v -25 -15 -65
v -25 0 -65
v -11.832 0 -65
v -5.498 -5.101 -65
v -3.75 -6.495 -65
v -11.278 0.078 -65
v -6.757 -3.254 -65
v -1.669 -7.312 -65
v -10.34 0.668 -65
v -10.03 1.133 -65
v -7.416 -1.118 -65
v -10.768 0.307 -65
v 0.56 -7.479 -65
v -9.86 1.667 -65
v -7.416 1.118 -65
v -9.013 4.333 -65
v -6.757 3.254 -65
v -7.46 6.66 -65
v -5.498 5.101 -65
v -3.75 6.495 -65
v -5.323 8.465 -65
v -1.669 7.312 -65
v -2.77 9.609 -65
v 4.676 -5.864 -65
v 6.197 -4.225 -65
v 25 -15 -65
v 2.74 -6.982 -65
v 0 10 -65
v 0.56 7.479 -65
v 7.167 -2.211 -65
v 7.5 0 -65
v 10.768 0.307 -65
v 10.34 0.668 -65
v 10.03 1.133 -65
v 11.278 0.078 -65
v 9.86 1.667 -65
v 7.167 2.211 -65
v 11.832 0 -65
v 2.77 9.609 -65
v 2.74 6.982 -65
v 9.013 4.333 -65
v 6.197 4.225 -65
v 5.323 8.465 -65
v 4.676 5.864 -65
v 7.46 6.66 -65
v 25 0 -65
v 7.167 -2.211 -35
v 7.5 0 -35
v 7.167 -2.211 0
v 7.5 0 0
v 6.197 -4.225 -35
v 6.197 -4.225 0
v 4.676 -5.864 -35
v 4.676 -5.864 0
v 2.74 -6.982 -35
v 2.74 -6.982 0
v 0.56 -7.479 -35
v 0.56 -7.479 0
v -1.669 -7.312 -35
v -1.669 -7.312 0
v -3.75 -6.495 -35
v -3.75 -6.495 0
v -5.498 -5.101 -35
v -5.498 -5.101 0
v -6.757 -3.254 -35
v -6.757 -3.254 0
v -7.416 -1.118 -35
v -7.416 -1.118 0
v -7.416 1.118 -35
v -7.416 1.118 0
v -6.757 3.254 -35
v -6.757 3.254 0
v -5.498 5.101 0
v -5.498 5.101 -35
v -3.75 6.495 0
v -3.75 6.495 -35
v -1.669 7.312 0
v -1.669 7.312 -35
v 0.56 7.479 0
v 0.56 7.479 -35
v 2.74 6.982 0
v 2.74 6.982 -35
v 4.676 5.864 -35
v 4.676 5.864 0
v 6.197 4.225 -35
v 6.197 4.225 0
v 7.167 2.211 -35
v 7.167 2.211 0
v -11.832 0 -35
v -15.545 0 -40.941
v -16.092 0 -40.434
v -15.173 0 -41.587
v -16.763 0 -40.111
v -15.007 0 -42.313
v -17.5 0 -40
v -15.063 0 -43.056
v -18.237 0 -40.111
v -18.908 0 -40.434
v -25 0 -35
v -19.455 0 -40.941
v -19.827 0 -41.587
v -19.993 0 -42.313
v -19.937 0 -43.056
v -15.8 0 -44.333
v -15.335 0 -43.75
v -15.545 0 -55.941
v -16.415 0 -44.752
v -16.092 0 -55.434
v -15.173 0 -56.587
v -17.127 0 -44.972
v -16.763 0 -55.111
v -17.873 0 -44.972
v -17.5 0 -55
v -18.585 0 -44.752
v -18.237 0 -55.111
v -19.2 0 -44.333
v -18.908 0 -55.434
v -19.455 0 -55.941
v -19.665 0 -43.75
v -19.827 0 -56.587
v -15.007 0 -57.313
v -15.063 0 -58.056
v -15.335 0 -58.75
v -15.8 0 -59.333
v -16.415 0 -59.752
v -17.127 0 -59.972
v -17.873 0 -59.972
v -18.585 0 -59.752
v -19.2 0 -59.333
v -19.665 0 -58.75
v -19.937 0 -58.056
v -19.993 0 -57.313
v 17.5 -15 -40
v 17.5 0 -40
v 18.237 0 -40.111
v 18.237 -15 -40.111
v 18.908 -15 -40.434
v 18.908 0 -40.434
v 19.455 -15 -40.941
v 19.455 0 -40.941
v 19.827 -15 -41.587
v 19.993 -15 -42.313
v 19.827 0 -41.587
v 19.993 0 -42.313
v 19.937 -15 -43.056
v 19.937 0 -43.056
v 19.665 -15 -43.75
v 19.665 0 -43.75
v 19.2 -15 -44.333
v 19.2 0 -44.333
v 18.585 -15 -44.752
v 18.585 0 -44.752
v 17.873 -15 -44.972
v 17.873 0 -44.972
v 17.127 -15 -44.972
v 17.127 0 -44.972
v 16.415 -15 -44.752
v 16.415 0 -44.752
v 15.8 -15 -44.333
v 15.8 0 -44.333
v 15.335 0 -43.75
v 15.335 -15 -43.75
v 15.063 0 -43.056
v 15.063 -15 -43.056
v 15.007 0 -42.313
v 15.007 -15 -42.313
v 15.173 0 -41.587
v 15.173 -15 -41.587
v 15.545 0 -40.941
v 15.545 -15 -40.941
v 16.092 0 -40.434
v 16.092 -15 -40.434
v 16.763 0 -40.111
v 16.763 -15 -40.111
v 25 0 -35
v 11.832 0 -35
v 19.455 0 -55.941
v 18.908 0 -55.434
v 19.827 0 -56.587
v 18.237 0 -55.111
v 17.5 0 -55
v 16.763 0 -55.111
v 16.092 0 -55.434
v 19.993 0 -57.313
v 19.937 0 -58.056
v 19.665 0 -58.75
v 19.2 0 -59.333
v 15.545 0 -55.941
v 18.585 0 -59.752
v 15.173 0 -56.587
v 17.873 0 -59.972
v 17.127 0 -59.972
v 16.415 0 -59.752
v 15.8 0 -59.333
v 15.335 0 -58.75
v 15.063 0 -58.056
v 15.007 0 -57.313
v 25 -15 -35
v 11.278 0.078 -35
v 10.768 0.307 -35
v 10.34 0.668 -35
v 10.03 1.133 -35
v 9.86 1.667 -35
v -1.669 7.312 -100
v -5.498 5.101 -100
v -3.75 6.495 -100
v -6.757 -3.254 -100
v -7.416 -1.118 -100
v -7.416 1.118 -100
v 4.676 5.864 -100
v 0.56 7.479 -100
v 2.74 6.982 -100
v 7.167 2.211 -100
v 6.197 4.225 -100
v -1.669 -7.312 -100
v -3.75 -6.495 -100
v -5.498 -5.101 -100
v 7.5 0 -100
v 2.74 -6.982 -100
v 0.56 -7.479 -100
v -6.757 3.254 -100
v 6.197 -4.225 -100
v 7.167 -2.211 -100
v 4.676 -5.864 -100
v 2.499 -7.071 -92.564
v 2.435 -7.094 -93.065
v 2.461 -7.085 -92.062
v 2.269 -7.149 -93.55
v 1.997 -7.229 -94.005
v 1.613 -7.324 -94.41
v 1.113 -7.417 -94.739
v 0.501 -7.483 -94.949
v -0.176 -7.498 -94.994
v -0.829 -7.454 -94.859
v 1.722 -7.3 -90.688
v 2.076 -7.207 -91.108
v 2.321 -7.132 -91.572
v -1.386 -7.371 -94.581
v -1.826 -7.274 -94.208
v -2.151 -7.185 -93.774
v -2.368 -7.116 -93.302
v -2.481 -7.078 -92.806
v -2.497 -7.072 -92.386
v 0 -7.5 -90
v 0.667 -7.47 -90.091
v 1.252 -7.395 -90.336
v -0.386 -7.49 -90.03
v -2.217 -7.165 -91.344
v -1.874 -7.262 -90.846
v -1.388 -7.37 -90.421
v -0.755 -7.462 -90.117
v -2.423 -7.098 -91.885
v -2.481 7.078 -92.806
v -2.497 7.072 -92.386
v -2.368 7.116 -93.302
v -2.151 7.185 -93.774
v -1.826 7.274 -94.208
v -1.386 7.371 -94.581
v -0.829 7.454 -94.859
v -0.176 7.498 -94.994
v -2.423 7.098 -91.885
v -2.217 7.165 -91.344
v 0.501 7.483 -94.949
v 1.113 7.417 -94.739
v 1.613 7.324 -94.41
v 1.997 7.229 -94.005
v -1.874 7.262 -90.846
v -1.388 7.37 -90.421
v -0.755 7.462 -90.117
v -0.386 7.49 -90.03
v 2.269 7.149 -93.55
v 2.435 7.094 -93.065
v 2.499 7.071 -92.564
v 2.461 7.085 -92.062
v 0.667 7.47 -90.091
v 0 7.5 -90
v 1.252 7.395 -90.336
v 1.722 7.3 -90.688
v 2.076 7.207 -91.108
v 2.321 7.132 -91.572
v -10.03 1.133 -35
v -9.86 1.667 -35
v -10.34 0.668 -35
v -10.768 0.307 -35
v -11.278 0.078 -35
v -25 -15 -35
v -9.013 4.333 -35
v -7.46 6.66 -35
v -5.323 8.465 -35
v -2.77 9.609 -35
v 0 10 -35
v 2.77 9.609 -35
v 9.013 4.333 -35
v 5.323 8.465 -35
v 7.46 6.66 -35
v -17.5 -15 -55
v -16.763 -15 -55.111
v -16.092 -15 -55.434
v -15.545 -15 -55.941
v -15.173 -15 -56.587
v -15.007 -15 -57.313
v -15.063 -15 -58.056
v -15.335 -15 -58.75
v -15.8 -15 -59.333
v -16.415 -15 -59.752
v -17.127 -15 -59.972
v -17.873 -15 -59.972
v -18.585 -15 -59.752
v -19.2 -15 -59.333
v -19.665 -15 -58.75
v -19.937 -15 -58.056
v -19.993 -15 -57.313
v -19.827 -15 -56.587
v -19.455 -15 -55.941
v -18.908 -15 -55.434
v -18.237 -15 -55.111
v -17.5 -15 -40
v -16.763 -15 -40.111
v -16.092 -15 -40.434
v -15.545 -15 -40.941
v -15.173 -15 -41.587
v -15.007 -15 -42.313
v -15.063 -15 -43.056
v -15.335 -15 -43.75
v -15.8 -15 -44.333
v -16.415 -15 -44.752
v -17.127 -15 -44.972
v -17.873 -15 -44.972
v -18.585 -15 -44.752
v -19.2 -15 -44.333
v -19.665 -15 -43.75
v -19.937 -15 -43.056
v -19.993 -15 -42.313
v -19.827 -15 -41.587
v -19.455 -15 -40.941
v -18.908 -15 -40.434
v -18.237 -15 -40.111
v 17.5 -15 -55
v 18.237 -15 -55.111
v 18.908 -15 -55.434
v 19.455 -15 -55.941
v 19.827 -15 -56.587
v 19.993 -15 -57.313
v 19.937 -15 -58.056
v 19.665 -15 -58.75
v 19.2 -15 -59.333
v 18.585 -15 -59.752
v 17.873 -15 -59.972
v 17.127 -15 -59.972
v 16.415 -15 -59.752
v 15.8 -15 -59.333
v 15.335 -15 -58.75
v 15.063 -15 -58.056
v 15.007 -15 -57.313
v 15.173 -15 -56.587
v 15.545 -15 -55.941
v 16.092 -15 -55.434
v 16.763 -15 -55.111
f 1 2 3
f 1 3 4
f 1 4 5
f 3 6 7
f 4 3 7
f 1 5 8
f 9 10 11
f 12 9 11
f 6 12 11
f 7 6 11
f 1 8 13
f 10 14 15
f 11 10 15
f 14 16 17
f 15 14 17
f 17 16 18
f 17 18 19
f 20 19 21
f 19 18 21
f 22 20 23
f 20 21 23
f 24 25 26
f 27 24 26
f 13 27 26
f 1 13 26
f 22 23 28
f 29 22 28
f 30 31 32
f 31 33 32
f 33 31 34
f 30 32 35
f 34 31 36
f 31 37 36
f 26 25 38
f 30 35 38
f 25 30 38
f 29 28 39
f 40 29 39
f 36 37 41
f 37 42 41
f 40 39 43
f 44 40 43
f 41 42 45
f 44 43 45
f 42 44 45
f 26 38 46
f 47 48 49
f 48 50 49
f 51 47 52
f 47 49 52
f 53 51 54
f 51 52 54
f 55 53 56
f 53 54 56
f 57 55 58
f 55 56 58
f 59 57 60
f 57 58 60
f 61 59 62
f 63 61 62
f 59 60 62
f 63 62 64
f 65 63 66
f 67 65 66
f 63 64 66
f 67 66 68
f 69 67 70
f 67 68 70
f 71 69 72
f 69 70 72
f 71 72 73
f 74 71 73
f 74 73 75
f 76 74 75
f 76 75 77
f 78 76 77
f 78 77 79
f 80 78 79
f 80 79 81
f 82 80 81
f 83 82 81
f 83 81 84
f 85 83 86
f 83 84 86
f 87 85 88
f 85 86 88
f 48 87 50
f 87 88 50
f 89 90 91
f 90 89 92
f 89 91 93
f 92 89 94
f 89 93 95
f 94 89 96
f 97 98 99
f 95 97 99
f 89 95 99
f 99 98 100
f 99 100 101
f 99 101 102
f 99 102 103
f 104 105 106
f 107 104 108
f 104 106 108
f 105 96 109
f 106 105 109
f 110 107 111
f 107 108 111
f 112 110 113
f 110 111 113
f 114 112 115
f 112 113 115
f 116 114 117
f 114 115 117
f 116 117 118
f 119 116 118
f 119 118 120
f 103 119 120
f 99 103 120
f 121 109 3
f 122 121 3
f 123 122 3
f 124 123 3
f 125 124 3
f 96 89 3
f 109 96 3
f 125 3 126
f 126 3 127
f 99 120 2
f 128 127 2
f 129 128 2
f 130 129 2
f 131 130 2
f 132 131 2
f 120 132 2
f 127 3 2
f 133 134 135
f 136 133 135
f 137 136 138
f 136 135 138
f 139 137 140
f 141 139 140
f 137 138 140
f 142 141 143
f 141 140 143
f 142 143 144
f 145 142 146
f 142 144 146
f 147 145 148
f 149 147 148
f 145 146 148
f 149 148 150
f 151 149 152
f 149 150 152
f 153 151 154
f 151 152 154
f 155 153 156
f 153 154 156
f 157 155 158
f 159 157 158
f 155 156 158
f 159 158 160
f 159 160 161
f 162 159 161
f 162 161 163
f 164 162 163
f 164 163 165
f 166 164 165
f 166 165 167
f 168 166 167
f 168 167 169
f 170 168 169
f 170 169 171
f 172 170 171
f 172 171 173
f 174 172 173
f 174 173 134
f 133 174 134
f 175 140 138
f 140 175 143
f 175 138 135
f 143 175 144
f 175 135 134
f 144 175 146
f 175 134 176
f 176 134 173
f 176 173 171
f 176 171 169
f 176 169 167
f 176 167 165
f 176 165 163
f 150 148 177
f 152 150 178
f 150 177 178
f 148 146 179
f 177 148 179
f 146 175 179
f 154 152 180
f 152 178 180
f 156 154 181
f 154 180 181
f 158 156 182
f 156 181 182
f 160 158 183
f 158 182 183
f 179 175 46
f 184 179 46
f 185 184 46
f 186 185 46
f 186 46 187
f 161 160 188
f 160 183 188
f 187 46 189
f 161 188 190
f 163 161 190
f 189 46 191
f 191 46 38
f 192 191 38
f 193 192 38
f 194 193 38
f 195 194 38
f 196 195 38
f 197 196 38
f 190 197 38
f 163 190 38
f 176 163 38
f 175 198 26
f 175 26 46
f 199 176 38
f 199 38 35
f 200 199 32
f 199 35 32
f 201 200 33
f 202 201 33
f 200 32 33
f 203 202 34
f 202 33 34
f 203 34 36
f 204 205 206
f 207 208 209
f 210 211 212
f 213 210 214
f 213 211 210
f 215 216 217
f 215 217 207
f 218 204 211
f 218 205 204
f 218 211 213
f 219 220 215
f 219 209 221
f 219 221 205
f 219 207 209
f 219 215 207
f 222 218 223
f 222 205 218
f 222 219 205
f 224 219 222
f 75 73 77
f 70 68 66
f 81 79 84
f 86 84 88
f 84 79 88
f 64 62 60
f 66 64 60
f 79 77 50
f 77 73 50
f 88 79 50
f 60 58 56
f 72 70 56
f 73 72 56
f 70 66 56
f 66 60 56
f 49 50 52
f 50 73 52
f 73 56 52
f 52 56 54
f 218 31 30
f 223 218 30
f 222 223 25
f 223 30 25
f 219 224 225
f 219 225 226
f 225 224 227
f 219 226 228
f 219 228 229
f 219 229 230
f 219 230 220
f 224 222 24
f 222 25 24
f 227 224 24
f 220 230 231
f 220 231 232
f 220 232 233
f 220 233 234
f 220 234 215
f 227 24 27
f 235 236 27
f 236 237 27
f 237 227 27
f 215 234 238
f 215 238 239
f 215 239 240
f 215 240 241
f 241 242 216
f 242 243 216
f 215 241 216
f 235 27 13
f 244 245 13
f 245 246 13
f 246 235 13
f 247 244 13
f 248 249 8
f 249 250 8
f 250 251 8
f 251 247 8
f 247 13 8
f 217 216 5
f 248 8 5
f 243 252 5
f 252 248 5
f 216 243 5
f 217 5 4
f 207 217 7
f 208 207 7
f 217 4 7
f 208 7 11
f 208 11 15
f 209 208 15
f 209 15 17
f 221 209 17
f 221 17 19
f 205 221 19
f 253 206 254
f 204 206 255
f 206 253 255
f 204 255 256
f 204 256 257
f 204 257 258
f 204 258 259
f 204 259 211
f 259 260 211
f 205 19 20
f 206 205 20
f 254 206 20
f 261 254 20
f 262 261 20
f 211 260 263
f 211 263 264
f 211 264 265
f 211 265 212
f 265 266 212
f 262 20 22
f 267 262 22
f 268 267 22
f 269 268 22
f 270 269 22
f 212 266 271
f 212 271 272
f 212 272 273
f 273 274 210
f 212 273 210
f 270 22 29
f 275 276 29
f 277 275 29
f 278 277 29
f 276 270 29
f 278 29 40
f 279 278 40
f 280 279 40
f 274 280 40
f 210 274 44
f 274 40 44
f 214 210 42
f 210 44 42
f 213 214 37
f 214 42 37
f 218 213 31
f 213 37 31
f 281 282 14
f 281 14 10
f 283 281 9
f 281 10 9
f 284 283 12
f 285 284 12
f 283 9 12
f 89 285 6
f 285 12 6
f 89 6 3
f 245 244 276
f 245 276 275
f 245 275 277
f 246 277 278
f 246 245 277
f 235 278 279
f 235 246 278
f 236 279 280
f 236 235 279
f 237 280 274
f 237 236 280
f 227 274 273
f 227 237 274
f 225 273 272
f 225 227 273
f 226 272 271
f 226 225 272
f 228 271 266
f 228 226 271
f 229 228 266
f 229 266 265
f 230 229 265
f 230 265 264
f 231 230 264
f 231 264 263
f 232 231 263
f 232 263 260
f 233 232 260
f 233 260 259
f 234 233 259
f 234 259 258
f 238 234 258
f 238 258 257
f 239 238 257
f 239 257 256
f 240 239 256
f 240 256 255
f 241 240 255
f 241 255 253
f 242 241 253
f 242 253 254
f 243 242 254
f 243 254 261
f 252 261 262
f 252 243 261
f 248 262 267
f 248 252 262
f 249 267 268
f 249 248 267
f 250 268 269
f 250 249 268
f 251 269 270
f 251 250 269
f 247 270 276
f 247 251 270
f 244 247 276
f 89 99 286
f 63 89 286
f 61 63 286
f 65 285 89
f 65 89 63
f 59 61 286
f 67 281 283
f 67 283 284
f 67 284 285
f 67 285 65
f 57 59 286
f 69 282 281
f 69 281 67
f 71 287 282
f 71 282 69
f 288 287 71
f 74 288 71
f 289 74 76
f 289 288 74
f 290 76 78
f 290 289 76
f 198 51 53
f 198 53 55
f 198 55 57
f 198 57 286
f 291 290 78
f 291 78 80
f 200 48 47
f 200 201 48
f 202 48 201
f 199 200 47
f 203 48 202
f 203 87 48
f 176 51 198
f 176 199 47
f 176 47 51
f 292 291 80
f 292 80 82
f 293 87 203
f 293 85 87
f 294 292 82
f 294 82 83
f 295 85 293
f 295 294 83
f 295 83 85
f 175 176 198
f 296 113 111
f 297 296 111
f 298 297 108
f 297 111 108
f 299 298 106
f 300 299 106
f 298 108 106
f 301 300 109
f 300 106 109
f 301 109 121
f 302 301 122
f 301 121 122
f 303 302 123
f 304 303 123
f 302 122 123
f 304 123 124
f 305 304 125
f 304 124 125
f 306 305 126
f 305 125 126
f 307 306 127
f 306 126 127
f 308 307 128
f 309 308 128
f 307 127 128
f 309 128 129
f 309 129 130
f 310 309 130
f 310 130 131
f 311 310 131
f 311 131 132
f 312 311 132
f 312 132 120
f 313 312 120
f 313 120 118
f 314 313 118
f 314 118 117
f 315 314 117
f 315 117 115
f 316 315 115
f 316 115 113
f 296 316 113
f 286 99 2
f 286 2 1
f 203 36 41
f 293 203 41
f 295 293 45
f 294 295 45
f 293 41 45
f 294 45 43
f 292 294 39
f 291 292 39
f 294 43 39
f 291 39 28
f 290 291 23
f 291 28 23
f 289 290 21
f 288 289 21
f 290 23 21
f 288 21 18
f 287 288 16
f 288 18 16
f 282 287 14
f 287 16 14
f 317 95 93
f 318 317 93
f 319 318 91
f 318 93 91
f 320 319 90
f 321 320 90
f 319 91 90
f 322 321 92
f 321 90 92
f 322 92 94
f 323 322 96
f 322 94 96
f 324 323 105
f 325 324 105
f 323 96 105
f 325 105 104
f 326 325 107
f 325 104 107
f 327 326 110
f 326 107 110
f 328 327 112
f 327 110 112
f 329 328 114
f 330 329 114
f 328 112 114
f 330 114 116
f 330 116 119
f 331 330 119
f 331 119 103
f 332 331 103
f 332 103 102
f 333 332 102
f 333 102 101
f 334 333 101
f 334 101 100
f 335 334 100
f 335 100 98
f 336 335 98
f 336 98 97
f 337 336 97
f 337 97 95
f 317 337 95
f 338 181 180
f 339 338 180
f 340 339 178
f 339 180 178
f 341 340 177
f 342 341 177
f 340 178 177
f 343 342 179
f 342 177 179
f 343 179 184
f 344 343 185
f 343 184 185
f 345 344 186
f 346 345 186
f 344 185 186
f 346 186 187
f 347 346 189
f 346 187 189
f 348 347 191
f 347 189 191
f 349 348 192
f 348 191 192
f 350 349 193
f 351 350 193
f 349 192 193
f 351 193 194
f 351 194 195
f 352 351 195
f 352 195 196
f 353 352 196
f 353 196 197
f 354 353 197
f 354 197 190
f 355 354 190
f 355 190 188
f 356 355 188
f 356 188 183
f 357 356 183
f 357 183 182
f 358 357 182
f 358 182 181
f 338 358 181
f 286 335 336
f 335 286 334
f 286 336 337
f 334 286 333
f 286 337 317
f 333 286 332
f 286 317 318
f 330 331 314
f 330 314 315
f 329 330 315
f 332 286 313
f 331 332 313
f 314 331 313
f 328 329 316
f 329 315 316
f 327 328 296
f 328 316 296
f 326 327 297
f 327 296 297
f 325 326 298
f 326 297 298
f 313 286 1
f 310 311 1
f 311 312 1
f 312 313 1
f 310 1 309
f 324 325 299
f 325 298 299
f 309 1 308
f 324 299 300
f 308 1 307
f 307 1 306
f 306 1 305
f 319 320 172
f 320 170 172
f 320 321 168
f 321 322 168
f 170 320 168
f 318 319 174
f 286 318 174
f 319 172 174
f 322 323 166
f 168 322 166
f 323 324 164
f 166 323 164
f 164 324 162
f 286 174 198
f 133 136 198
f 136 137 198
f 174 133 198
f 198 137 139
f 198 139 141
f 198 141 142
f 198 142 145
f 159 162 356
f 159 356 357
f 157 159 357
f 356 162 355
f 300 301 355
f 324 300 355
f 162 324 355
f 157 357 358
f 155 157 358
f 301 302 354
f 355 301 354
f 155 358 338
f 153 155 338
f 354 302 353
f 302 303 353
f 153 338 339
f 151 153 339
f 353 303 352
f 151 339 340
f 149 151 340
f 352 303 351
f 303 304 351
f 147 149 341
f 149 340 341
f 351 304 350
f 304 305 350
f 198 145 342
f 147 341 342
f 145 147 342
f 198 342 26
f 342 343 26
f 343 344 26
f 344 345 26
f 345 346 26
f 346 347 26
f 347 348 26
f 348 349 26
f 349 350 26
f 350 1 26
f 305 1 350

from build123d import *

# Parameters (mm, degrees)
BOSS_EXTRUDE1_DEPTH      = 15
BOSS_EXTRUDE1_DEPTH_BACK = 15
SKETCH6_R                = 2.5
CUT_EXTRUDE2_DEPTH       = 25
CUT_EXTRUDE3_DEPTH       = 35
CUT_EXTRUDE3_DEPTH_BACK  = 30
SKETCH8_R                = 2.5


with BuildPart() as part:
    # Sketch1 → Revolve1 (revolve)
    with BuildSketch(Plane(origin=(0, 0, 0), x_dir=(1, 0, 0), z_dir=(0, 1, 0))):
        Polygon((0, 90), (0, 100), (2, 100), (7.5, 100), (7.5, 65), (9, 65), (9, 35), (7.5, 35), (7.5, 0), (0, 0), align=None)
    revolve(axis=Axis((0, 0, -90), (0, 0, -1)))

    # Sketch5 → Boss-Extrude1 (add, two sides: drawn at the far end of the back side and taken through both)
    with BuildSketch(Plane.XY.offset(-50).offset(-BOSS_EXTRUDE1_DEPTH_BACK)):
        with BuildLine():
            Line((-25, -10), (-25, -15))
            Line((-25, -15), (25, -15))
            Line((25, -15), (25, -10))
            Line((25, -10), (25, 0))
            Line((25, 0), (20, 0))
            Line((20, 0), (12.5, 0))
            Line((12.5, 0), (11.832159566, 0))
            ThreePointArc((11.832159566, 0), (10.541165117, 0.472474768), (9.860132972, 1.666666667))
            ThreePointArc((9.860132972, 1.666666667), (0, 10), (-9.860132972, 1.666666667))
            ThreePointArc((-9.860132972, 1.666666667), (-10.541165117, 0.472474768), (-11.832159566, 0))
            Line((-11.832159566, 0), (-12.5, 0))
            Line((-12.5, 0), (-20, 0))
            Line((-20, 0), (-25, 0))
            Line((-25, 0), (-25, -10))
        make_face()
    extrude(amount=BOSS_EXTRUDE1_DEPTH + BOSS_EXTRUDE1_DEPTH_BACK)

    # Sketch6 → Cut-Extrude2 (cut)
    with BuildSketch(Plane(origin=(0, 0, 0), x_dir=(1, 0, 0), z_dir=(0, 1, 0))):
        with Locations(Location((-17.5, 57.5, 0), (0, 0, 270))):
            Circle(SKETCH6_R)
        with Locations(Location((17.5, 57.5, 0), (0, 0, 270))):
            Circle(SKETCH6_R)
        with Locations(Location((17.5, 42.5, 0), (0, 0, 270))):
            Circle(SKETCH6_R)
        with Locations(Location((-17.5, 42.5, 0), (0, 0, 270))):
            Circle(SKETCH6_R)
    extrude(amount=-CUT_EXTRUDE2_DEPTH, mode=Mode.SUBTRACT)

    # Sketch8 → Cut-Extrude3 (cut, two sides: drawn at the far end of the back side and taken through both)
    with BuildSketch(Plane(origin=(0, 0, 0), x_dir=(1, 0, 0), z_dir=(0, 1, 0)).offset(-CUT_EXTRUDE3_DEPTH_BACK)):
        with Locations(Location((0, 92.5, 0), (0, 0, 270))):
            Circle(SKETCH8_R)
    extrude(amount=CUT_EXTRUDE3_DEPTH + CUT_EXTRUDE3_DEPTH_BACK, mode=Mode.SUBTRACT)


solid = part.part
